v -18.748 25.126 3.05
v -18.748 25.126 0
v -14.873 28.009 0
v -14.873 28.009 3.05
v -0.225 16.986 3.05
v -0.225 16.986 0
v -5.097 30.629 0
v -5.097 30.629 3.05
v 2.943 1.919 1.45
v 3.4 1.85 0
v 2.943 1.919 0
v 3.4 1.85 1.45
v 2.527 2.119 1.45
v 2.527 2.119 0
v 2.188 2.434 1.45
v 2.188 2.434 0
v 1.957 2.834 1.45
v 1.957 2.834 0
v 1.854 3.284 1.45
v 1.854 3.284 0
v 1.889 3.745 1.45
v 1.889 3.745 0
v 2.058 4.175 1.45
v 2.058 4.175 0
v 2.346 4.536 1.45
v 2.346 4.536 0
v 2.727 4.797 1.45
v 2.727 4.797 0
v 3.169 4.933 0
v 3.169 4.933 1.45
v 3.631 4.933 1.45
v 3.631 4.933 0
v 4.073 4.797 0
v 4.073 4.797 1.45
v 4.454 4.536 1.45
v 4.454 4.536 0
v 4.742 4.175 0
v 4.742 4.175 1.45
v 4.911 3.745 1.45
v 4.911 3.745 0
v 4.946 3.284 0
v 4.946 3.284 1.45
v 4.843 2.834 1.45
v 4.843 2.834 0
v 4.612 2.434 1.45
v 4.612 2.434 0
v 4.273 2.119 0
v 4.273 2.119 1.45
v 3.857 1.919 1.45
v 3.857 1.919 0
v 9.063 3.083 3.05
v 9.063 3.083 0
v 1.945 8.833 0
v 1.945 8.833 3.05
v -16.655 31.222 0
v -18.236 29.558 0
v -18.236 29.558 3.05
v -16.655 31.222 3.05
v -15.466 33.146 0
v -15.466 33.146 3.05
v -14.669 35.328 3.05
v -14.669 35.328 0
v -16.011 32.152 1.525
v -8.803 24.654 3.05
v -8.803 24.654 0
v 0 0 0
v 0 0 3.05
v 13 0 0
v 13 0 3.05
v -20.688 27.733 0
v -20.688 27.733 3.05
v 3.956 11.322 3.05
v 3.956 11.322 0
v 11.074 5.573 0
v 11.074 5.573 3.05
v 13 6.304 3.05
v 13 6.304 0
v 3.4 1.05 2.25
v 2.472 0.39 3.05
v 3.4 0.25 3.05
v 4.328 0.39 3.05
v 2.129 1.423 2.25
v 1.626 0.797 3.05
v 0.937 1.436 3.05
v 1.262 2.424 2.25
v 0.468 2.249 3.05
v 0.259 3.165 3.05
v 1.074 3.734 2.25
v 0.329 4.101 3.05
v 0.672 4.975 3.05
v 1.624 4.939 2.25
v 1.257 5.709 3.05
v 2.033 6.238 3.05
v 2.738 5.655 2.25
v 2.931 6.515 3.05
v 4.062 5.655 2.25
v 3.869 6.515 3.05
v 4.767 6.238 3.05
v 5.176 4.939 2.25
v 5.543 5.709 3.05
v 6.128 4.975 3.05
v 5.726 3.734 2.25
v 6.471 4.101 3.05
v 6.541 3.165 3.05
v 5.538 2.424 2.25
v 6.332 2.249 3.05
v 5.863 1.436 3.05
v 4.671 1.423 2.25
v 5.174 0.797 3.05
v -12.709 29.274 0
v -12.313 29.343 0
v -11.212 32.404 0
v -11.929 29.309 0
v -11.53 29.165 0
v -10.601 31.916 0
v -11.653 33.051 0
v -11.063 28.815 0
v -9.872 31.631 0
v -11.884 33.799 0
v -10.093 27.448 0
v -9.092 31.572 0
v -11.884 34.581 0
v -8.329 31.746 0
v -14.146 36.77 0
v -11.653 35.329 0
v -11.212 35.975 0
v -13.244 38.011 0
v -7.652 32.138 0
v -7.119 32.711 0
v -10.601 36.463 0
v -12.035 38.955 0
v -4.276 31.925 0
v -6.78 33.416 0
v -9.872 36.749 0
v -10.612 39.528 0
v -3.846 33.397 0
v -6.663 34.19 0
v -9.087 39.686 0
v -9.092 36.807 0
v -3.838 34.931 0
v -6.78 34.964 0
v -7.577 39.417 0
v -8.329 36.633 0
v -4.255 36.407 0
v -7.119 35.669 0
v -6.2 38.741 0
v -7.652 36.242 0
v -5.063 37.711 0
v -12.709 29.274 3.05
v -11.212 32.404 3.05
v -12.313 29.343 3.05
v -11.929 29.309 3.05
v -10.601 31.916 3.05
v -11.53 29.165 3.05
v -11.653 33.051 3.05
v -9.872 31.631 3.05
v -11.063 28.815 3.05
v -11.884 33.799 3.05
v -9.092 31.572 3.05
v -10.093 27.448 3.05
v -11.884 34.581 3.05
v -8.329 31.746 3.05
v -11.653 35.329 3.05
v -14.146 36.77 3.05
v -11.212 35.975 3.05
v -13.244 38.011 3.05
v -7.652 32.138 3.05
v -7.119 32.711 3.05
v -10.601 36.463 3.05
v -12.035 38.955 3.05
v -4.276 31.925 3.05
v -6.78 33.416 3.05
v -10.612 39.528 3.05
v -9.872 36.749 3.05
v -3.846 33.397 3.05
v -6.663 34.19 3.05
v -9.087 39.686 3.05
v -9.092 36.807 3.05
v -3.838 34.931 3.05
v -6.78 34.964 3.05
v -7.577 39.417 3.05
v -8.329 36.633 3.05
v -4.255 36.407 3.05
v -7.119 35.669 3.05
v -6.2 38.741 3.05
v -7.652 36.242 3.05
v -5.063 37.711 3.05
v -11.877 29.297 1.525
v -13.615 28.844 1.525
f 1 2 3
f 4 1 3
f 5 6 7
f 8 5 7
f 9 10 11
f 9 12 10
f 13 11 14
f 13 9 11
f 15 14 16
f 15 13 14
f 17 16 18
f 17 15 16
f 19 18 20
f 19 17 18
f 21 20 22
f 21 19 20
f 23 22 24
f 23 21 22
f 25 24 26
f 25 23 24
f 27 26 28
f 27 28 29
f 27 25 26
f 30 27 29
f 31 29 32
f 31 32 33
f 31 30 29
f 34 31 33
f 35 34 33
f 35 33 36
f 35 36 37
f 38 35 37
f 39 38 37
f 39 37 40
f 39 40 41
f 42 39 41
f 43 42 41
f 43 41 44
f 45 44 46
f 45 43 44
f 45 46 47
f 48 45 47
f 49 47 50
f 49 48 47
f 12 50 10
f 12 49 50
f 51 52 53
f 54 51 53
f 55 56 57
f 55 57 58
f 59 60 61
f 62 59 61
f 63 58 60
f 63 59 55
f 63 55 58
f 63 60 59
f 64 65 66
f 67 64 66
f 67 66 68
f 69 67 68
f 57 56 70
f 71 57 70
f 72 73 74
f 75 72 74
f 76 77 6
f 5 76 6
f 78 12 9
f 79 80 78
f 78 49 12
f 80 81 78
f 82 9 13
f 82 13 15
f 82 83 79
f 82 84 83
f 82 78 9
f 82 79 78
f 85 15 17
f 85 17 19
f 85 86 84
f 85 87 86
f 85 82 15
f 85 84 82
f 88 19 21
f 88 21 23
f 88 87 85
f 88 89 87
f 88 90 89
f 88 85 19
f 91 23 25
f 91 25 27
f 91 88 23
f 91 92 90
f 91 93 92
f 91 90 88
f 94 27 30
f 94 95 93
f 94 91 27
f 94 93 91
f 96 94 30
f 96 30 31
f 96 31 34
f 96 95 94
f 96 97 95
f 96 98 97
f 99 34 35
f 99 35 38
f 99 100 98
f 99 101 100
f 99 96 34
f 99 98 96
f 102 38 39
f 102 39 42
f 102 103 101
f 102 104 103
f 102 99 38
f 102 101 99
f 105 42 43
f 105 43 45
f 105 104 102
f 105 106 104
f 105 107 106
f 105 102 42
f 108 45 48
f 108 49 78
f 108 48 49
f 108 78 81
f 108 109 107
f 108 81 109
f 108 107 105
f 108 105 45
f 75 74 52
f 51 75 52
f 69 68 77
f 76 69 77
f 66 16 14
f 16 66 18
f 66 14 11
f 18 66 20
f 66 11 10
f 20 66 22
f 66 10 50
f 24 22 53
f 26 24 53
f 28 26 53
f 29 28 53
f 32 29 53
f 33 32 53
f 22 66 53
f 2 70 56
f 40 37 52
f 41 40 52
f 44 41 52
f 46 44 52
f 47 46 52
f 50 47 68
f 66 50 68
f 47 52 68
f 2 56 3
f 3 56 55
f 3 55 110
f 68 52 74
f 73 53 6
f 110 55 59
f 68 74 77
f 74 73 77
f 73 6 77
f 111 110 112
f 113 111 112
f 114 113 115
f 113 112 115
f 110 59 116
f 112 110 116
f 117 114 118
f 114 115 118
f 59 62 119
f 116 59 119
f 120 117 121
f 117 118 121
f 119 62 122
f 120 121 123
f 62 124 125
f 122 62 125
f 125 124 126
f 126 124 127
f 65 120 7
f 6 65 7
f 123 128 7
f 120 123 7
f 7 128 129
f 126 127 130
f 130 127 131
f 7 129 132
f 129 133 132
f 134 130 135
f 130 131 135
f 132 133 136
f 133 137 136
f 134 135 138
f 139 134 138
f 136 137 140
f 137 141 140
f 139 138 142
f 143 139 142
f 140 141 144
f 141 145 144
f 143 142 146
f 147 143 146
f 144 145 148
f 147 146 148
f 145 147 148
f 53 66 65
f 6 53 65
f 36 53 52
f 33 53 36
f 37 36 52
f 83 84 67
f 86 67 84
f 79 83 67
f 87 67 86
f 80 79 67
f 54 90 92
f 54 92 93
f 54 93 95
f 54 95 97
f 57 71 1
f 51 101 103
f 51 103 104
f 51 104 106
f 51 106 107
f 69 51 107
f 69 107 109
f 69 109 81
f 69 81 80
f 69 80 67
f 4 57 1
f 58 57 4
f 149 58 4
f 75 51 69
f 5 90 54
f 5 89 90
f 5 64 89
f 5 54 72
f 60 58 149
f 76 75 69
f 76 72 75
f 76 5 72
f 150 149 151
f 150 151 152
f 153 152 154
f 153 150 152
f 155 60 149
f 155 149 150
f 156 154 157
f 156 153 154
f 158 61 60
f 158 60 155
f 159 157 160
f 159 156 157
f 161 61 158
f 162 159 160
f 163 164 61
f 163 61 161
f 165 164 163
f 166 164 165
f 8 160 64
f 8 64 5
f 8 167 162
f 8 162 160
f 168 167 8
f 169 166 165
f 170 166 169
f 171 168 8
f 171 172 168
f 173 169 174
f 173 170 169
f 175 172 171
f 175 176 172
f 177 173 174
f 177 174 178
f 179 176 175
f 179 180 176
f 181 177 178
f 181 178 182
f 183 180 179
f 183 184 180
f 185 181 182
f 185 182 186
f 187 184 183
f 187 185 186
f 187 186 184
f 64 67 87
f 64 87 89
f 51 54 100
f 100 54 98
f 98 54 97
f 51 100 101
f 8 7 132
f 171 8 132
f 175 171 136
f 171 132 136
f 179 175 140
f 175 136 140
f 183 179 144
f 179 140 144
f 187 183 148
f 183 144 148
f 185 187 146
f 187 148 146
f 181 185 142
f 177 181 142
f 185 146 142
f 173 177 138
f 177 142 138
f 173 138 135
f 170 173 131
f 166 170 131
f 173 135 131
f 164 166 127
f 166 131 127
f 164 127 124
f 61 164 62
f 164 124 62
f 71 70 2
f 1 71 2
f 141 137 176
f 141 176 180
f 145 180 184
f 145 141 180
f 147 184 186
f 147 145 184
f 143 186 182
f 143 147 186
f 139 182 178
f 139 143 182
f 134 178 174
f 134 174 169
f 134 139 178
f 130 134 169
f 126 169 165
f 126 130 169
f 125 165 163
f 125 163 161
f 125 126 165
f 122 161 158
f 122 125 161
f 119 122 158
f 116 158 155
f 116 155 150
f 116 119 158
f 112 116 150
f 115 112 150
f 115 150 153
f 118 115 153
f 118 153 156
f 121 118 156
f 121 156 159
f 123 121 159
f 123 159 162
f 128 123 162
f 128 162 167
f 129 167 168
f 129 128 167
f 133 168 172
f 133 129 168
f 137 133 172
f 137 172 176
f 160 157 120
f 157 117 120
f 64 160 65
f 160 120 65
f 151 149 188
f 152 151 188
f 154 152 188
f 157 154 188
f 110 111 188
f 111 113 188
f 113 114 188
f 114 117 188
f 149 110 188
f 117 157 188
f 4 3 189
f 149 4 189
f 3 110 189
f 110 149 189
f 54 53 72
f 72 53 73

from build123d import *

# Parameters (mm, degrees)
SKETCH1_R           = 1.5
SKETCH1_R_2         = 2.625
BOSS_EXTRUDE1_DEPTH = 3.05


with BuildPart() as part:
    # Sketch1 → Boss-Extrude1 (new body)
    with BuildSketch(Plane.XY):
        with BuildLine():
            Line((-8.803360363, 24.654236343), (0, 0))
            Line((0, 0), (13, 0))
            Line((13, 0), (13, 6.303908615))
            Line((13, 6.303908615), (-0.225000063, 16.985639436))
            Line((-0.225000063, 16.985639436), (-5.096612315, 30.628825091))
            ThreePointArc((-5.096612315, 30.628825091), (-6.864545193, 39.127004069), (-14.669149283, 35.327953187))
            add(Edge.make_bspline(
                [(-18.236074249, 29.557782775), (-15.56964568, 31.860427367), (-14.669149283, 35.327953187)],
                knots=[0, 0, 0, 1, 1, 1], degree=2))
            Line((-18.236074249, 29.557782775), (-20.68803125, 27.733458745))
            Line((-20.68803125, 27.733458745), (-18.748011912, 25.126003095))
            Line((-18.748011912, 25.126003095), (-14.872658256, 28.009373723))
            add(Edge.make_bspline(
                [(-14.872658256, 28.009373723), (-13.321413482, 29.087354752), (-12.034218378, 29.87005609), (-10.324464656, 28.408317489), (-8.803360363, 24.654236343)],
                knots=[0, 0, 0, 0, 0.517103648, 1, 1, 1, 1], degree=3))
        make_face()
        with Locations((3.4, 3.4)):
            Circle(SKETCH1_R, mode=Mode.SUBTRACT)
        Polygon((11.073847559, 5.572751724), (9.110294099, 3.141685535), (9.063168816, 3.083339947), (1.945007017, 8.832624477), (3.95568576, 11.322036253), align=None, mode=Mode.SUBTRACT)
        with Locations((-9.28819898, 34.189808273)):
            Circle(SKETCH1_R_2, mode=Mode.SUBTRACT)
    extrude(amount=BOSS_EXTRUDE1_DEPTH)

    # Sketch3 → CSK for M3 Flat Head Machine Screw1 (revolve, cut)
    with BuildSketch(Plane(origin=(3.4, 3.4, 3.05), x_dir=(0, -1, 0), z_dir=(1, 0, 0))):
        Polygon((0, 0), (0, 3.05), (1.55, 3.05), (1.55, 1.6), (3.15, 0), align=None)
    revolve(axis=Axis((3.4, 3.4, 9.4), (0, 0, -1)), mode=Mode.SUBTRACT)


solid = part.part
